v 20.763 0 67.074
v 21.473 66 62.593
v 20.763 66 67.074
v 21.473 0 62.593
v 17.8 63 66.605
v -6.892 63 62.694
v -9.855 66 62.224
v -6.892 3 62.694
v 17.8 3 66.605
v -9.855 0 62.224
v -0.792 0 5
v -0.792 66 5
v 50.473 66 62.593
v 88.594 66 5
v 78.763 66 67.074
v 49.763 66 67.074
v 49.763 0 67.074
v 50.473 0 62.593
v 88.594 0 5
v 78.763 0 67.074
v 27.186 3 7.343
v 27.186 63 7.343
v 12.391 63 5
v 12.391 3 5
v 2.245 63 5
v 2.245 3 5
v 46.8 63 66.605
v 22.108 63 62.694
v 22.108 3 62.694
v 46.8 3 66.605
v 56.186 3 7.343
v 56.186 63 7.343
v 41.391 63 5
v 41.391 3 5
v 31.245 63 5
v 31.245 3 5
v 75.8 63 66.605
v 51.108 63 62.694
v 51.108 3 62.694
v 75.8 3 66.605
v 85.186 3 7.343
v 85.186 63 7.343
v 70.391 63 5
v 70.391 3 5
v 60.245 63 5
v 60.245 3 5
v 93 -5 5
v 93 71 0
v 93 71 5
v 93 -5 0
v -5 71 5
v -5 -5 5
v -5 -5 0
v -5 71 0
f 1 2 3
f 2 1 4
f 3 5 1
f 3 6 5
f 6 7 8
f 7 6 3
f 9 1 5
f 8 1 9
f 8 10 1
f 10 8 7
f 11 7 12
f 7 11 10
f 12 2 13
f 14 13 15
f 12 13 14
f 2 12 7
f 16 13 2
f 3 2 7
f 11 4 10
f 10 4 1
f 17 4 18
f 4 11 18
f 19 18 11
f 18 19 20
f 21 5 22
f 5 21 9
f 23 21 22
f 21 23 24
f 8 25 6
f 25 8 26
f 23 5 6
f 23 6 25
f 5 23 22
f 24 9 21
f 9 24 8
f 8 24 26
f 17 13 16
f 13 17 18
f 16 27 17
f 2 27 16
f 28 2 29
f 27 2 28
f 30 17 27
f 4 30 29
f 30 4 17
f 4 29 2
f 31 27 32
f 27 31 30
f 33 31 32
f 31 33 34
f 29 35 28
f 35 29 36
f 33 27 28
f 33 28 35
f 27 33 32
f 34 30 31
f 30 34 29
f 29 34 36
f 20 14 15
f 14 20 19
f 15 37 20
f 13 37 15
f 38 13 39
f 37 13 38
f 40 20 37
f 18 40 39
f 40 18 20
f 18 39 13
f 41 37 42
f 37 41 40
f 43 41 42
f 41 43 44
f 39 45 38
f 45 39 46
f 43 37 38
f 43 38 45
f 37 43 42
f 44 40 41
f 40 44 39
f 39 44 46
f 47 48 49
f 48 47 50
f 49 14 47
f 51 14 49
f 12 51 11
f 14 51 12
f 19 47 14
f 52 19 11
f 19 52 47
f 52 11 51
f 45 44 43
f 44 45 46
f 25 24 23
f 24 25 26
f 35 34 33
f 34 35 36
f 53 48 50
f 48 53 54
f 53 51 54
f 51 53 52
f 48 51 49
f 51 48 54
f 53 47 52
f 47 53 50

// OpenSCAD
rotate([0, -9, 0]) holder();
translate([25+4, 0, 0]) rotate([0, -9, 0])  holder();
translate([(25+4)*2, 0, 0]) rotate([0, -9, 0])  holder();
translate([-5, -5, 0]) cube([98,60+6+10,5]);
module holder() {
    difference(){
        cube([25+6,60+6,60+3]);
        translate([3, 3, 3]) cube([25,60,60]);
    }
}
